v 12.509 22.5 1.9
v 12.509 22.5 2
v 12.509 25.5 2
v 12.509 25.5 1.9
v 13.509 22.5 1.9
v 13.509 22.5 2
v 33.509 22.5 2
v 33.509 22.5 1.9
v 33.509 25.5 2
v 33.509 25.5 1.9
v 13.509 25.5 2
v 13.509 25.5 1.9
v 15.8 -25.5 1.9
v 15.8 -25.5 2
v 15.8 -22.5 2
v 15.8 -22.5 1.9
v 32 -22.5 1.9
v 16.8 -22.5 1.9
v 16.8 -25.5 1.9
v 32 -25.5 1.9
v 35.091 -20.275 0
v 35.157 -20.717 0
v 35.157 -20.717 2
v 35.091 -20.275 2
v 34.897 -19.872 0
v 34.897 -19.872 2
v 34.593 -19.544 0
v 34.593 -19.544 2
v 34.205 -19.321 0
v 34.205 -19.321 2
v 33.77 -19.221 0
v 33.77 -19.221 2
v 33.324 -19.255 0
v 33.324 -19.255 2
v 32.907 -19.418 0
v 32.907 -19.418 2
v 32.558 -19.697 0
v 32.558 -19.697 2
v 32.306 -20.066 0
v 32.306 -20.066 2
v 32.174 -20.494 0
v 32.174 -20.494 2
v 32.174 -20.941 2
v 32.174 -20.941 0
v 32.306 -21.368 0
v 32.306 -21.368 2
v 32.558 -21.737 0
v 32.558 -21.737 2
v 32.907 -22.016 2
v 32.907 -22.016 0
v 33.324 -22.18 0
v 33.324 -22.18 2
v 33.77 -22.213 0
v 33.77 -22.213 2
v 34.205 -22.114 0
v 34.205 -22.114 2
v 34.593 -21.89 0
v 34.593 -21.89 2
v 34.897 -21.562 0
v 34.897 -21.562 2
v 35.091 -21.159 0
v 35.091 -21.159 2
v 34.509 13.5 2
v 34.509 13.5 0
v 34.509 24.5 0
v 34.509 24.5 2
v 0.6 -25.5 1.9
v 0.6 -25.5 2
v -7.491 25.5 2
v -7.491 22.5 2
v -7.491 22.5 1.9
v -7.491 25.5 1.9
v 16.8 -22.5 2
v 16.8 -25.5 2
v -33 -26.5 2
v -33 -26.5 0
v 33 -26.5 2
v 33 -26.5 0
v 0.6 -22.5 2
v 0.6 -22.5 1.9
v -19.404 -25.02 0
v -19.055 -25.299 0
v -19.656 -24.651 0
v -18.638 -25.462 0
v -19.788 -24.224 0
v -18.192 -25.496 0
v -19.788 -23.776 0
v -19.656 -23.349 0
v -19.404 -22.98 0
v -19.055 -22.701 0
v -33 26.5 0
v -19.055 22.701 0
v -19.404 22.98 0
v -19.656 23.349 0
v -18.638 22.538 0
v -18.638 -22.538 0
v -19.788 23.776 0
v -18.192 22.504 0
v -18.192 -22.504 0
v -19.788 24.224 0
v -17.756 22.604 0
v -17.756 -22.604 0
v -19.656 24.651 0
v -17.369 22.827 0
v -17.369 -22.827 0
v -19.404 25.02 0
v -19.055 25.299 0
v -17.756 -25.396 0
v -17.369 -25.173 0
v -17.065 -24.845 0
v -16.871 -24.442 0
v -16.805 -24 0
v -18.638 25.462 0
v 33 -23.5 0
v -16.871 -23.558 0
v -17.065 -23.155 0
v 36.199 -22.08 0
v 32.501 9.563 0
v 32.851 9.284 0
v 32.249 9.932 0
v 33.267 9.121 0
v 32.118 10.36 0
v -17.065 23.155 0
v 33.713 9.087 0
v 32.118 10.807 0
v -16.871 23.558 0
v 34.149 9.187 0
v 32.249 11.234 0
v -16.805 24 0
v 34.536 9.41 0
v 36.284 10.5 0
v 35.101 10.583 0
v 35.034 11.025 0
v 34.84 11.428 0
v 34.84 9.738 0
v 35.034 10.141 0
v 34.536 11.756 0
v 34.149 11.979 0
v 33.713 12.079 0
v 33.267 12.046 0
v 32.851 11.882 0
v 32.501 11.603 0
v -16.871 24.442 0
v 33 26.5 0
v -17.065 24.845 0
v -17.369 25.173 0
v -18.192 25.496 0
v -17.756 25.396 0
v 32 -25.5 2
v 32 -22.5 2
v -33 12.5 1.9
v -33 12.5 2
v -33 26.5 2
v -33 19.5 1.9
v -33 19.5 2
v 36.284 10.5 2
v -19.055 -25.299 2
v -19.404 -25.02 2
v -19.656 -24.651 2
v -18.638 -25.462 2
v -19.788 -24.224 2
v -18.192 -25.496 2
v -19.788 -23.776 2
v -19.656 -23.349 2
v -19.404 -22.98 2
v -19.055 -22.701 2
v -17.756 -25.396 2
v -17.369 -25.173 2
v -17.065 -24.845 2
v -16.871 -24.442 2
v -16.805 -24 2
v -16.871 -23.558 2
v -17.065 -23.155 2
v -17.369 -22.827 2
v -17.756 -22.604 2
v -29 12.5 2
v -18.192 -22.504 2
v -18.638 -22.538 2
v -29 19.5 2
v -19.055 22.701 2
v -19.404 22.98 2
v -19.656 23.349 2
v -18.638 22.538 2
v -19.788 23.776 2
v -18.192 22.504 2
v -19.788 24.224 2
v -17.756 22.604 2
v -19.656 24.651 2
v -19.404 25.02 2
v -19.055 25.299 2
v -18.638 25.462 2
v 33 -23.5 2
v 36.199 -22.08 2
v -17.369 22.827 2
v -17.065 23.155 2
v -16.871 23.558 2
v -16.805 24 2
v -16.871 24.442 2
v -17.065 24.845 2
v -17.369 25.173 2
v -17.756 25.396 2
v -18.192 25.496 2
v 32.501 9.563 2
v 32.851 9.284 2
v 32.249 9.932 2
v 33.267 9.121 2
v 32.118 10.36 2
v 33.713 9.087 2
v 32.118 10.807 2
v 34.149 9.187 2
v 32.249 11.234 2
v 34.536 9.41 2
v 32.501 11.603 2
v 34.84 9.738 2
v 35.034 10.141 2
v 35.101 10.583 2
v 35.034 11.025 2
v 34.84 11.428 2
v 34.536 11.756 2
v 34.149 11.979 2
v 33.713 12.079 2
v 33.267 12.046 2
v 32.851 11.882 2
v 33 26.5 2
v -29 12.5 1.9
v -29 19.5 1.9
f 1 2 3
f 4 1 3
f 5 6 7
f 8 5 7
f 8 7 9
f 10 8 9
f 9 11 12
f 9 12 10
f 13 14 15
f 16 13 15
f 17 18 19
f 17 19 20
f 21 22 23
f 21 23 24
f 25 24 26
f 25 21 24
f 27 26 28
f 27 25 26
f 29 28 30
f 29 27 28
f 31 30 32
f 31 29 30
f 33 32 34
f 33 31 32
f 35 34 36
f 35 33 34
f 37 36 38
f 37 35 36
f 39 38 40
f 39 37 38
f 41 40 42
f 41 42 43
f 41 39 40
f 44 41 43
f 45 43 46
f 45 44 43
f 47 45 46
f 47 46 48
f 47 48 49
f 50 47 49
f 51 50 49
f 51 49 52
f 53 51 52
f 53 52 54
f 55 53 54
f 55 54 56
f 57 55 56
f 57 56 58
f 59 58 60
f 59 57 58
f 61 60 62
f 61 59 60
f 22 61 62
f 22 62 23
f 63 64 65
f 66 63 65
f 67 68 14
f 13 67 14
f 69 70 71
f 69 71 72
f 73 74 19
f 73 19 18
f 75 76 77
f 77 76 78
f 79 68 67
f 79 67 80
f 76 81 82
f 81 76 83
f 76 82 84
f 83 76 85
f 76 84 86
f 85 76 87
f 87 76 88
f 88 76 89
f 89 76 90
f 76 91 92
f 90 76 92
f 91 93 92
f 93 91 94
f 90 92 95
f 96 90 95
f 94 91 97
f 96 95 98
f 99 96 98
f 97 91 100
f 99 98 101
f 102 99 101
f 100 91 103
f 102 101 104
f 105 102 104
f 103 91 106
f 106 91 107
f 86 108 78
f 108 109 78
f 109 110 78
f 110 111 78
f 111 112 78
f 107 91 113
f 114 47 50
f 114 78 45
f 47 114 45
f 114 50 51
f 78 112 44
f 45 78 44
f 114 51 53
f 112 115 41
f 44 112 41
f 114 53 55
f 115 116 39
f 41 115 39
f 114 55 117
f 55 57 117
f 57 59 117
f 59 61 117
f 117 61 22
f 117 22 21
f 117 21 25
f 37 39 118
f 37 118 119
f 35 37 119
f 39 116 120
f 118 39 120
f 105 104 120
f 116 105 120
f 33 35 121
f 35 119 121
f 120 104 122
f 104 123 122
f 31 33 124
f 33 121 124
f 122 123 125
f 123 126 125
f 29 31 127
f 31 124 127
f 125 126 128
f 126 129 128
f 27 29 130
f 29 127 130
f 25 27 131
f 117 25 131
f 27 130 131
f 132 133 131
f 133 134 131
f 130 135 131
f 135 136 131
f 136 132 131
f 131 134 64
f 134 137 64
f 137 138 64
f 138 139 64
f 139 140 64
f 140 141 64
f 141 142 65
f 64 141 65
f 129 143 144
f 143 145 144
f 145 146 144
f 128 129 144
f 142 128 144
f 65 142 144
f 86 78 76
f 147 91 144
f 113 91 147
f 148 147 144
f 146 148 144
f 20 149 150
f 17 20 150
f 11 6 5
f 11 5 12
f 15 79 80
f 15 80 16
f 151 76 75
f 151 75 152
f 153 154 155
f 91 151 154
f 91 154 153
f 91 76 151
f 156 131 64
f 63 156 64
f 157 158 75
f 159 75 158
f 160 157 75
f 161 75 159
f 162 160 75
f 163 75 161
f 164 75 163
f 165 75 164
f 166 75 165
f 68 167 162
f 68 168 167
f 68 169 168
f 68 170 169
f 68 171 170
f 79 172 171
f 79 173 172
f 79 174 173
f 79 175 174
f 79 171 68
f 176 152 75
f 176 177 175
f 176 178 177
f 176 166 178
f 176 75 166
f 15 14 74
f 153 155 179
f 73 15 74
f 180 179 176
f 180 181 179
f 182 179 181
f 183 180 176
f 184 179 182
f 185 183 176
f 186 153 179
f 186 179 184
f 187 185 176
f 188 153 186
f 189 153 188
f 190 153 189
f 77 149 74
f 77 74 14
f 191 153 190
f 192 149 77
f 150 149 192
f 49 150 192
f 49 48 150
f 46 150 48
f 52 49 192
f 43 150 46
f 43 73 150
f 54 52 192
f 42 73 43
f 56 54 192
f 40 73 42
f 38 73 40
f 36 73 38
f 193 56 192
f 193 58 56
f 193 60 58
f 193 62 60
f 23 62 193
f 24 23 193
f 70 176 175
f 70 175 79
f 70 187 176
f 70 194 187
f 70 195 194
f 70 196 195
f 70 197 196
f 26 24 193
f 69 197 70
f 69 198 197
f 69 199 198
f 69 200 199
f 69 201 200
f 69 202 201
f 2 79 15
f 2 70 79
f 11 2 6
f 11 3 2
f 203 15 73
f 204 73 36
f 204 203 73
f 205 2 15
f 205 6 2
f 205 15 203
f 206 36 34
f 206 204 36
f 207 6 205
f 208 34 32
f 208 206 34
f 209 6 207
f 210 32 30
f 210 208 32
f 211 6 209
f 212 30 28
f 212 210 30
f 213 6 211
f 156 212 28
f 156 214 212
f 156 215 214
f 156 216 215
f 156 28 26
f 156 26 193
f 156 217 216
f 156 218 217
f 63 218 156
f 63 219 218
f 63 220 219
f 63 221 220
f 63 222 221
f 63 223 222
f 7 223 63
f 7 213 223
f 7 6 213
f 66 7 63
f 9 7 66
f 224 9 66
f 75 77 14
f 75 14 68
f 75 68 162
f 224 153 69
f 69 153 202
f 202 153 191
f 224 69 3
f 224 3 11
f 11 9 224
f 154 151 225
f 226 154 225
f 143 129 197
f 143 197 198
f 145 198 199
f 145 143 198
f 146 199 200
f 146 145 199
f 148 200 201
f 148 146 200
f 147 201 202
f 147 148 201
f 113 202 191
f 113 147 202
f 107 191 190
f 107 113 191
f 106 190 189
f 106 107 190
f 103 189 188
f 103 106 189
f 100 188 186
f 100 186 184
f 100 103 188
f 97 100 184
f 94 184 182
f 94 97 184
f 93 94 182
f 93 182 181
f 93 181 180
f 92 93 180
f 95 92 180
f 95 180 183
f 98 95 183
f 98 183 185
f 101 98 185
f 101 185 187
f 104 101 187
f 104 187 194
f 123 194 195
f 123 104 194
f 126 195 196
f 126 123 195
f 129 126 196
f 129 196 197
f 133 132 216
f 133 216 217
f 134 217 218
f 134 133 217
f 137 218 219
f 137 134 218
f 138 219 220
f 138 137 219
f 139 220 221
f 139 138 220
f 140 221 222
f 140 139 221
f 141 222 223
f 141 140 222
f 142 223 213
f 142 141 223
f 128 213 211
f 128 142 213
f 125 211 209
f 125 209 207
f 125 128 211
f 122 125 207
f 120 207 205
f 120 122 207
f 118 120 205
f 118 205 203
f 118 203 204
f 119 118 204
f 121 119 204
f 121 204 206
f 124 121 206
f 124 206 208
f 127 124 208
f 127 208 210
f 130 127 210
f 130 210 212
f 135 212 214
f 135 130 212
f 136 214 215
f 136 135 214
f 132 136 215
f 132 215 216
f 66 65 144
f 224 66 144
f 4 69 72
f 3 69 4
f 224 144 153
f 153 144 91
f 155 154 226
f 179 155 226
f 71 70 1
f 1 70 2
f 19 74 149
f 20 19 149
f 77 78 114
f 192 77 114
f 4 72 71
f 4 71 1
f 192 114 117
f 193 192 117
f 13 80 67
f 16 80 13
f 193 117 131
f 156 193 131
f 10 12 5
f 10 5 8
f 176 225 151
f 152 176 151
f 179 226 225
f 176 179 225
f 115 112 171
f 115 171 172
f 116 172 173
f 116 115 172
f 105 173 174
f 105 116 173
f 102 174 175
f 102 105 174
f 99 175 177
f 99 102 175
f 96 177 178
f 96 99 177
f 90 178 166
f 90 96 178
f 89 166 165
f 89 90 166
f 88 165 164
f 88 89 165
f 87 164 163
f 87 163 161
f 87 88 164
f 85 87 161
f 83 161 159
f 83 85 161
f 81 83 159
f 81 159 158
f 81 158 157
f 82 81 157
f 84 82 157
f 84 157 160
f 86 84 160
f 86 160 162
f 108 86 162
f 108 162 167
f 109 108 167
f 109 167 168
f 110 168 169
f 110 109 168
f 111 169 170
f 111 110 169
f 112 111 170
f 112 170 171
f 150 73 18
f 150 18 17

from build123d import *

# Parameters (mm, degrees)
F0_R     = 1.5
F1_DEPTH = 2
F0_W     = 4
F0_H     = 7
F2_DEPTH = 0.1
F3_DEPTH = 1.9
F4_W     = 20
F4_H     = 3
F5_DEPTH = 0.1
F4_W_2   = 15.2
F6_DEPTH = 0.1


with BuildPart() as f1:
    # F0 (on Top) → F1 (new body)
    with BuildSketch(Plane.XY):
        Polygon((-20, 26.5), (-33, 26.5), (-33, 19.5), (-29, 19.5), (-29, 12.5), (-33, 12.5), (-33, -26.5), (-20, -26.5), (33, -26.5), (33, -23.5), (36.198911, -22.0798), (36.284242, 10.5), (34.509105, 13.5), (34.509105, 24.5), (33, 26.5), align=None)
        with Locations((-18.304507, -24)):
            Circle(F0_R, mode=Mode.SUBTRACT)
        with Locations((33.657469, -20.717213)):
            Circle(F0_R, mode=Mode.SUBTRACT)
        with Locations((-18.304507, 24)):
            Circle(F0_R, mode=Mode.SUBTRACT)
        with Locations((33.600888, 10.583145)):
            Circle(F0_R, mode=Mode.SUBTRACT)
    extrude(amount=F1_DEPTH)

    # F0 (on Top) → F2 (cut)
    with BuildSketch(Plane.XY):
        with Locations((-31, 16)):
            Rectangle(F0_W, F0_H)
    extrude(amount=-F2_DEPTH, mode=Mode.SUBTRACT)

    # F0 (on Top) → F3 (join)
    with BuildSketch(Plane.XY):
        with Locations((-31, 16)):
            Rectangle(F0_W, F0_H)
    extrude(amount=F3_DEPTH)

    # F4 (on face) → F5 (cut)
    with BuildSketch(Plane.XY.offset(2)):
        with Locations((2.509105, 24)):
            Rectangle(F4_W, F4_H)
        with Locations((23.509105, 24)):
            Rectangle(F4_W, F4_H)
    extrude(amount=-F5_DEPTH, mode=Mode.SUBTRACT)

    # F4 (on face) → F6 (cut)
    with BuildSketch(Plane.XY.offset(2)):
        with Locations((8.2, -24)):
            Rectangle(F4_W_2, F4_H)
        with Locations((24.4, -24)):
            Rectangle(F4_W_2, F4_H)
    extrude(amount=-F6_DEPTH, mode=Mode.SUBTRACT)


solid = f1.part
